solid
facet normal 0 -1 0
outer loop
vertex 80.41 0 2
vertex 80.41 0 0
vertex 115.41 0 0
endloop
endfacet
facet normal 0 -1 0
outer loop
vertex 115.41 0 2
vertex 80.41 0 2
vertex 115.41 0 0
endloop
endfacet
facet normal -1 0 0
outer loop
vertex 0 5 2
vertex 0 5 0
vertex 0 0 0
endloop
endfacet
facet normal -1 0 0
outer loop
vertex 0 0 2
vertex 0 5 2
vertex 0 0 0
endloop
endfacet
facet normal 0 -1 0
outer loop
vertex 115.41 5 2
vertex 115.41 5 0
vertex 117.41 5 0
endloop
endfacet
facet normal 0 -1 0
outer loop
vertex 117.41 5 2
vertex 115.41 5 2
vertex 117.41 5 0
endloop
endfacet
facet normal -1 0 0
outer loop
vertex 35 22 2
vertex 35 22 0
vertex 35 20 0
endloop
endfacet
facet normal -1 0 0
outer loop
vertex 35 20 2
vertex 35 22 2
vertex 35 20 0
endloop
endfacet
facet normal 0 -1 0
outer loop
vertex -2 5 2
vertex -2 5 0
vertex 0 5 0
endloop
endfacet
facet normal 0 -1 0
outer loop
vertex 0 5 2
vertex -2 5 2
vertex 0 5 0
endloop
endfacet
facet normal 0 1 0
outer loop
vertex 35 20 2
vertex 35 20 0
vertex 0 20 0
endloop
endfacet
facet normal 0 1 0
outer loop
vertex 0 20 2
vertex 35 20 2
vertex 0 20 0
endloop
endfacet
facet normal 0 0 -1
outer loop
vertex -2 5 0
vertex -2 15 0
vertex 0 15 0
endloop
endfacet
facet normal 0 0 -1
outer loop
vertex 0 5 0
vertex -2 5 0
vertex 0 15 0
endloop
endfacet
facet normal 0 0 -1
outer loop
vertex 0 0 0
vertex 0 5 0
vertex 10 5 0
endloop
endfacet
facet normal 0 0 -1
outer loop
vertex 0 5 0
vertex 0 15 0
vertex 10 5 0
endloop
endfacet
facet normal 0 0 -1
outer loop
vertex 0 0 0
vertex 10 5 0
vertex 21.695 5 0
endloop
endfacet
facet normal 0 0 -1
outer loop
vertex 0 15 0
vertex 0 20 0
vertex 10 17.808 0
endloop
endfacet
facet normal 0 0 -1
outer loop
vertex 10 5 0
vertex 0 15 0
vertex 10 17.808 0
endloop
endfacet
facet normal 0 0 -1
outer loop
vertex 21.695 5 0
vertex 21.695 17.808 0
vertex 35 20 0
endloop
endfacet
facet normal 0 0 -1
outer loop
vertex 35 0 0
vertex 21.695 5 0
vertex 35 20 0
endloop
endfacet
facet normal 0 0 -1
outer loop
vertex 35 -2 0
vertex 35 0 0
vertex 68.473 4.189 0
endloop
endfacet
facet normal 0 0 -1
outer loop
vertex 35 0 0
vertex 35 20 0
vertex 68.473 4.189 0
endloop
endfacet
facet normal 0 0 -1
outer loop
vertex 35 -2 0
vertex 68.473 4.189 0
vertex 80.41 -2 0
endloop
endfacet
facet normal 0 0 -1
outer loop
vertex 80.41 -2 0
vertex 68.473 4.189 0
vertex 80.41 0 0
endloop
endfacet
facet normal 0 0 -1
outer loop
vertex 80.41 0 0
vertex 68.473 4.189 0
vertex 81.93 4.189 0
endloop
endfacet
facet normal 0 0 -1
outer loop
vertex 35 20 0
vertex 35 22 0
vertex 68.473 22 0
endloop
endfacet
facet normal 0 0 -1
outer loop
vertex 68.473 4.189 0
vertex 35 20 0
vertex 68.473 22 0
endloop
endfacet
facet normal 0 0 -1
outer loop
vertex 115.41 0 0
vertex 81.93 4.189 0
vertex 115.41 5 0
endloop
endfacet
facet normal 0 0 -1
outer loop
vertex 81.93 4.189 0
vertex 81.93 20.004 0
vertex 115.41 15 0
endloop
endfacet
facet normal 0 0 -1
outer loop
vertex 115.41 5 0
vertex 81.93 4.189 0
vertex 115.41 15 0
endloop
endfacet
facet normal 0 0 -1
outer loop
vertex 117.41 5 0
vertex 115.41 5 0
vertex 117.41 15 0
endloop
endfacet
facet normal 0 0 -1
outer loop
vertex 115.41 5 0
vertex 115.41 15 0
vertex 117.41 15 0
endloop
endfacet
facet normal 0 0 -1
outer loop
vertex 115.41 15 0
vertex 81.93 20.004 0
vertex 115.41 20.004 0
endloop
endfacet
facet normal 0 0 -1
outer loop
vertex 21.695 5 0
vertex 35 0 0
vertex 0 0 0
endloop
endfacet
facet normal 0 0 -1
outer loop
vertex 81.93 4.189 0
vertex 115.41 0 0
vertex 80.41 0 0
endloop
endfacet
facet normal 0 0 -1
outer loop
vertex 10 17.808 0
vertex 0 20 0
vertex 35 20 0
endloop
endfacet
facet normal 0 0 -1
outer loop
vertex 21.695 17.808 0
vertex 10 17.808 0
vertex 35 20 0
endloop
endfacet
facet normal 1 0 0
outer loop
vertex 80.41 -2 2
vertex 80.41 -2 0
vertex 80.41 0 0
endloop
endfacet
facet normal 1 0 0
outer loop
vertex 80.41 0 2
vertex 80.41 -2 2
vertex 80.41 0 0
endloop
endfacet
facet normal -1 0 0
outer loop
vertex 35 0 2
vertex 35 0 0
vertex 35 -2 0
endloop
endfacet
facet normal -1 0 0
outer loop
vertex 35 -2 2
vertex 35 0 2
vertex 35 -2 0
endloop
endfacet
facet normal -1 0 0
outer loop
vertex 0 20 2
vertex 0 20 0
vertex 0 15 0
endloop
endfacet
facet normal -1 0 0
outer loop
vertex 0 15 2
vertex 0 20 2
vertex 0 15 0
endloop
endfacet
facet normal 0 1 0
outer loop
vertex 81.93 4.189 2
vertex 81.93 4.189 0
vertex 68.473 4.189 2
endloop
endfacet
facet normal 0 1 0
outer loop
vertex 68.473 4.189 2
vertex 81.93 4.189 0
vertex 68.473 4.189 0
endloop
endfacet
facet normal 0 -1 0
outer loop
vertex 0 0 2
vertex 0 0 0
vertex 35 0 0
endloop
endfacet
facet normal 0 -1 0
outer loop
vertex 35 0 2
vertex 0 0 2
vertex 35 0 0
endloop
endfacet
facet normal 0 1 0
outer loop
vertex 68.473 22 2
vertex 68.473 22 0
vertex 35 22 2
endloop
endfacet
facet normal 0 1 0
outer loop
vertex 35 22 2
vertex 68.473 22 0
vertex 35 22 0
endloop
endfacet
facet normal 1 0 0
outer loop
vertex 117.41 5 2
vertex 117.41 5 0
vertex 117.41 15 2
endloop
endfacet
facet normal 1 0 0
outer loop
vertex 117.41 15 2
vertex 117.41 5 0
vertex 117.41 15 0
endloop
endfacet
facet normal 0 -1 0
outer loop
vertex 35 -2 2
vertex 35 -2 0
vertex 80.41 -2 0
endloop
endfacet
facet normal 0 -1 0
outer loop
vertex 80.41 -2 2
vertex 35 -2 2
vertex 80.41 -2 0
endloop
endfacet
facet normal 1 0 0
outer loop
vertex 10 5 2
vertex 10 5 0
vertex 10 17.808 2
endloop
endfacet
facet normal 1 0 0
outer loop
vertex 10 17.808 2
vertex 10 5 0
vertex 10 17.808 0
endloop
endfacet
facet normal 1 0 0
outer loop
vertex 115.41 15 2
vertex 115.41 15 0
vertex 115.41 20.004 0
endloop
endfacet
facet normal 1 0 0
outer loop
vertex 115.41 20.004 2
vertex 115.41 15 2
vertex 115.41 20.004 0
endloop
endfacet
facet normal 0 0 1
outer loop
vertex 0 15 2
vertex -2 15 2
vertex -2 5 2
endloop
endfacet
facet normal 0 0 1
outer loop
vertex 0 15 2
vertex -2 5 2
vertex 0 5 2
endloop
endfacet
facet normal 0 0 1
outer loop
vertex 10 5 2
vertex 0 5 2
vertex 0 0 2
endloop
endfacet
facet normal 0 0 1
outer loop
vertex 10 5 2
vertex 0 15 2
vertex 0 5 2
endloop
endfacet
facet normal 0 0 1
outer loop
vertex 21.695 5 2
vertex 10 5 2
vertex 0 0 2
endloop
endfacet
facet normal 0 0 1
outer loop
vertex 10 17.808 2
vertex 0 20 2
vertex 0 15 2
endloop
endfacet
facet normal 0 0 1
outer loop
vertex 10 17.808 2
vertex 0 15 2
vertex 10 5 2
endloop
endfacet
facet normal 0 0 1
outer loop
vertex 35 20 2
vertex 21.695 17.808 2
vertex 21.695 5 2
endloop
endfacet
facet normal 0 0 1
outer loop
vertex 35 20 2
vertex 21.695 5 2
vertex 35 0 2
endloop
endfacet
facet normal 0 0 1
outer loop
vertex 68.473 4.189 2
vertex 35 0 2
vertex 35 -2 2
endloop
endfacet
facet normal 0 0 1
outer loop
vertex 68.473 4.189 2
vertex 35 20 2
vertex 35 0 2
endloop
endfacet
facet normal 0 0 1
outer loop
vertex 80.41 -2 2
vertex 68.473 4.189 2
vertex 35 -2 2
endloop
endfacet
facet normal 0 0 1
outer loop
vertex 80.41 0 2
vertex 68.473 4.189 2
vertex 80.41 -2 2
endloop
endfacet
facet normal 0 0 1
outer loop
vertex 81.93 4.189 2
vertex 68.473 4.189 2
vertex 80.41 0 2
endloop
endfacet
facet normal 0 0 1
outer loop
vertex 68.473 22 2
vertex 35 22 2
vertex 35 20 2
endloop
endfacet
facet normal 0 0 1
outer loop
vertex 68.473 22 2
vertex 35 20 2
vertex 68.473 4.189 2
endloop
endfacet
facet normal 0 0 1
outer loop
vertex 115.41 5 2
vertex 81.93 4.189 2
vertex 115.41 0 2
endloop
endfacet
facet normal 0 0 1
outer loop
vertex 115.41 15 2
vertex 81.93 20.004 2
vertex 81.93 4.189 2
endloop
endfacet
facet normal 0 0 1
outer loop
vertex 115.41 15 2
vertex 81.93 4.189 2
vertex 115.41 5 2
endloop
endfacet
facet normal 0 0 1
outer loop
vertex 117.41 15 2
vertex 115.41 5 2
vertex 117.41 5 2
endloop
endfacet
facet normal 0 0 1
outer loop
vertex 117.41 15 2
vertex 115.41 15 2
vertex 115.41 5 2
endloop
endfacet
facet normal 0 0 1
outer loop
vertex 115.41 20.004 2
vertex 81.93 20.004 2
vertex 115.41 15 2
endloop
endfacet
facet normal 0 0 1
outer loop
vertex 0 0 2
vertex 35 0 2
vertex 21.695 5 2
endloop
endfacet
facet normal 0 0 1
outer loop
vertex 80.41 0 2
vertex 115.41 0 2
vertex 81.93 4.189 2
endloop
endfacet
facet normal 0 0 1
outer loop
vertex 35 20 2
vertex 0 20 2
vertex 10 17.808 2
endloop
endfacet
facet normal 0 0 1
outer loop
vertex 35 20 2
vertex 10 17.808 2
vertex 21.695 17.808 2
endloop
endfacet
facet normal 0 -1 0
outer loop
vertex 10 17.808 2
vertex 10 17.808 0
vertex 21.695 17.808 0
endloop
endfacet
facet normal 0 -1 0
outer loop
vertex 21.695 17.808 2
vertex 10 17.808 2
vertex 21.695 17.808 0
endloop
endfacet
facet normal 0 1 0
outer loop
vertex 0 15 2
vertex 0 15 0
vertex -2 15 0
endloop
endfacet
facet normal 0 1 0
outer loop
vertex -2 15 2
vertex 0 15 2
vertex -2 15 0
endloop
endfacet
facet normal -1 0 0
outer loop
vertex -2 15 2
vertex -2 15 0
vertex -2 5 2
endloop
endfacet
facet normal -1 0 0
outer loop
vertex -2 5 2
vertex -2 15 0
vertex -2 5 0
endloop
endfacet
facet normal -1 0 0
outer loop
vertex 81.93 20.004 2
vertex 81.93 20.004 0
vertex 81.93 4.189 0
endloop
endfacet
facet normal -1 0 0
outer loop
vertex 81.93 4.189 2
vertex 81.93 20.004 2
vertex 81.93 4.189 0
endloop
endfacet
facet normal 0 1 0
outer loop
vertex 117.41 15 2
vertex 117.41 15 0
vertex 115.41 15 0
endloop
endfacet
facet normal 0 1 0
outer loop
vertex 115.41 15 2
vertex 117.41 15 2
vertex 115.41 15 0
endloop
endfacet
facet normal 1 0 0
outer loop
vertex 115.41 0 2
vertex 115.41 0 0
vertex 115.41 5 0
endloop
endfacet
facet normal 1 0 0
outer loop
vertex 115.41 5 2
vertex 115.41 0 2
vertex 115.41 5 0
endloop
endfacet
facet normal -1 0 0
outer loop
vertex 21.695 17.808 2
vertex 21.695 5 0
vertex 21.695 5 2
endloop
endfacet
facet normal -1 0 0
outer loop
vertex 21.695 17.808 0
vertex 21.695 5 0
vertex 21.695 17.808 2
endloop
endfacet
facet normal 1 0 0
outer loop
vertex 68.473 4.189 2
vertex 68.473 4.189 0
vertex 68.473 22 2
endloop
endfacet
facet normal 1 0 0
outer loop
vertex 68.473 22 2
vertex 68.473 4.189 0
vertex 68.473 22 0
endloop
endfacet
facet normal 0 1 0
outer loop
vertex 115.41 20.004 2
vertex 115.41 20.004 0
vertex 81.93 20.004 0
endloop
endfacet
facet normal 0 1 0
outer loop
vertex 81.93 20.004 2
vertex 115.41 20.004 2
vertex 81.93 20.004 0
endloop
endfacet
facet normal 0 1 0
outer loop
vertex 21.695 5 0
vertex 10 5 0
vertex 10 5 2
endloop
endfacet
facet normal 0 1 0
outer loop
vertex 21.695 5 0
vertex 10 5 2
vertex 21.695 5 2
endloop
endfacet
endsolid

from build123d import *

# Parameters (mm, degrees)
SKETCH1_W           = 11.695168442
SKETCH1_H           = 12.807944464
BOSS_EXTRUDE1_DEPTH = 2


with BuildPart() as part:
    # Sketch1 → Boss-Extrude1 (new body)
    with BuildSketch(Plane.XY):
        Polygon((0, 0), (35, 0), (35, -2.000471596), (80.41, -2.000471596), (80.41, 0), (115.41, 0), (115.41, 5), (117.41, 5), (117.41, 15), (115.409999943, 15), (115.409999943, 20.003619975), (81.929720774, 20.003619975), (81.929720774, 4.189216968), (68.473093168, 4.189216968), (68.473093168, 15.598586388), (68.473093168, 19.951067772), (68.473093168, 22), (35, 22), (35, 20), (0, 20), (0, 15), (-2, 15), (-2, 5), (0, 5), align=None)
        with Locations((15.847584221, 11.403972232)):
            Rectangle(SKETCH1_W, SKETCH1_H, mode=Mode.SUBTRACT)
    extrude(amount=BOSS_EXTRUDE1_DEPTH)


solid = part.part
